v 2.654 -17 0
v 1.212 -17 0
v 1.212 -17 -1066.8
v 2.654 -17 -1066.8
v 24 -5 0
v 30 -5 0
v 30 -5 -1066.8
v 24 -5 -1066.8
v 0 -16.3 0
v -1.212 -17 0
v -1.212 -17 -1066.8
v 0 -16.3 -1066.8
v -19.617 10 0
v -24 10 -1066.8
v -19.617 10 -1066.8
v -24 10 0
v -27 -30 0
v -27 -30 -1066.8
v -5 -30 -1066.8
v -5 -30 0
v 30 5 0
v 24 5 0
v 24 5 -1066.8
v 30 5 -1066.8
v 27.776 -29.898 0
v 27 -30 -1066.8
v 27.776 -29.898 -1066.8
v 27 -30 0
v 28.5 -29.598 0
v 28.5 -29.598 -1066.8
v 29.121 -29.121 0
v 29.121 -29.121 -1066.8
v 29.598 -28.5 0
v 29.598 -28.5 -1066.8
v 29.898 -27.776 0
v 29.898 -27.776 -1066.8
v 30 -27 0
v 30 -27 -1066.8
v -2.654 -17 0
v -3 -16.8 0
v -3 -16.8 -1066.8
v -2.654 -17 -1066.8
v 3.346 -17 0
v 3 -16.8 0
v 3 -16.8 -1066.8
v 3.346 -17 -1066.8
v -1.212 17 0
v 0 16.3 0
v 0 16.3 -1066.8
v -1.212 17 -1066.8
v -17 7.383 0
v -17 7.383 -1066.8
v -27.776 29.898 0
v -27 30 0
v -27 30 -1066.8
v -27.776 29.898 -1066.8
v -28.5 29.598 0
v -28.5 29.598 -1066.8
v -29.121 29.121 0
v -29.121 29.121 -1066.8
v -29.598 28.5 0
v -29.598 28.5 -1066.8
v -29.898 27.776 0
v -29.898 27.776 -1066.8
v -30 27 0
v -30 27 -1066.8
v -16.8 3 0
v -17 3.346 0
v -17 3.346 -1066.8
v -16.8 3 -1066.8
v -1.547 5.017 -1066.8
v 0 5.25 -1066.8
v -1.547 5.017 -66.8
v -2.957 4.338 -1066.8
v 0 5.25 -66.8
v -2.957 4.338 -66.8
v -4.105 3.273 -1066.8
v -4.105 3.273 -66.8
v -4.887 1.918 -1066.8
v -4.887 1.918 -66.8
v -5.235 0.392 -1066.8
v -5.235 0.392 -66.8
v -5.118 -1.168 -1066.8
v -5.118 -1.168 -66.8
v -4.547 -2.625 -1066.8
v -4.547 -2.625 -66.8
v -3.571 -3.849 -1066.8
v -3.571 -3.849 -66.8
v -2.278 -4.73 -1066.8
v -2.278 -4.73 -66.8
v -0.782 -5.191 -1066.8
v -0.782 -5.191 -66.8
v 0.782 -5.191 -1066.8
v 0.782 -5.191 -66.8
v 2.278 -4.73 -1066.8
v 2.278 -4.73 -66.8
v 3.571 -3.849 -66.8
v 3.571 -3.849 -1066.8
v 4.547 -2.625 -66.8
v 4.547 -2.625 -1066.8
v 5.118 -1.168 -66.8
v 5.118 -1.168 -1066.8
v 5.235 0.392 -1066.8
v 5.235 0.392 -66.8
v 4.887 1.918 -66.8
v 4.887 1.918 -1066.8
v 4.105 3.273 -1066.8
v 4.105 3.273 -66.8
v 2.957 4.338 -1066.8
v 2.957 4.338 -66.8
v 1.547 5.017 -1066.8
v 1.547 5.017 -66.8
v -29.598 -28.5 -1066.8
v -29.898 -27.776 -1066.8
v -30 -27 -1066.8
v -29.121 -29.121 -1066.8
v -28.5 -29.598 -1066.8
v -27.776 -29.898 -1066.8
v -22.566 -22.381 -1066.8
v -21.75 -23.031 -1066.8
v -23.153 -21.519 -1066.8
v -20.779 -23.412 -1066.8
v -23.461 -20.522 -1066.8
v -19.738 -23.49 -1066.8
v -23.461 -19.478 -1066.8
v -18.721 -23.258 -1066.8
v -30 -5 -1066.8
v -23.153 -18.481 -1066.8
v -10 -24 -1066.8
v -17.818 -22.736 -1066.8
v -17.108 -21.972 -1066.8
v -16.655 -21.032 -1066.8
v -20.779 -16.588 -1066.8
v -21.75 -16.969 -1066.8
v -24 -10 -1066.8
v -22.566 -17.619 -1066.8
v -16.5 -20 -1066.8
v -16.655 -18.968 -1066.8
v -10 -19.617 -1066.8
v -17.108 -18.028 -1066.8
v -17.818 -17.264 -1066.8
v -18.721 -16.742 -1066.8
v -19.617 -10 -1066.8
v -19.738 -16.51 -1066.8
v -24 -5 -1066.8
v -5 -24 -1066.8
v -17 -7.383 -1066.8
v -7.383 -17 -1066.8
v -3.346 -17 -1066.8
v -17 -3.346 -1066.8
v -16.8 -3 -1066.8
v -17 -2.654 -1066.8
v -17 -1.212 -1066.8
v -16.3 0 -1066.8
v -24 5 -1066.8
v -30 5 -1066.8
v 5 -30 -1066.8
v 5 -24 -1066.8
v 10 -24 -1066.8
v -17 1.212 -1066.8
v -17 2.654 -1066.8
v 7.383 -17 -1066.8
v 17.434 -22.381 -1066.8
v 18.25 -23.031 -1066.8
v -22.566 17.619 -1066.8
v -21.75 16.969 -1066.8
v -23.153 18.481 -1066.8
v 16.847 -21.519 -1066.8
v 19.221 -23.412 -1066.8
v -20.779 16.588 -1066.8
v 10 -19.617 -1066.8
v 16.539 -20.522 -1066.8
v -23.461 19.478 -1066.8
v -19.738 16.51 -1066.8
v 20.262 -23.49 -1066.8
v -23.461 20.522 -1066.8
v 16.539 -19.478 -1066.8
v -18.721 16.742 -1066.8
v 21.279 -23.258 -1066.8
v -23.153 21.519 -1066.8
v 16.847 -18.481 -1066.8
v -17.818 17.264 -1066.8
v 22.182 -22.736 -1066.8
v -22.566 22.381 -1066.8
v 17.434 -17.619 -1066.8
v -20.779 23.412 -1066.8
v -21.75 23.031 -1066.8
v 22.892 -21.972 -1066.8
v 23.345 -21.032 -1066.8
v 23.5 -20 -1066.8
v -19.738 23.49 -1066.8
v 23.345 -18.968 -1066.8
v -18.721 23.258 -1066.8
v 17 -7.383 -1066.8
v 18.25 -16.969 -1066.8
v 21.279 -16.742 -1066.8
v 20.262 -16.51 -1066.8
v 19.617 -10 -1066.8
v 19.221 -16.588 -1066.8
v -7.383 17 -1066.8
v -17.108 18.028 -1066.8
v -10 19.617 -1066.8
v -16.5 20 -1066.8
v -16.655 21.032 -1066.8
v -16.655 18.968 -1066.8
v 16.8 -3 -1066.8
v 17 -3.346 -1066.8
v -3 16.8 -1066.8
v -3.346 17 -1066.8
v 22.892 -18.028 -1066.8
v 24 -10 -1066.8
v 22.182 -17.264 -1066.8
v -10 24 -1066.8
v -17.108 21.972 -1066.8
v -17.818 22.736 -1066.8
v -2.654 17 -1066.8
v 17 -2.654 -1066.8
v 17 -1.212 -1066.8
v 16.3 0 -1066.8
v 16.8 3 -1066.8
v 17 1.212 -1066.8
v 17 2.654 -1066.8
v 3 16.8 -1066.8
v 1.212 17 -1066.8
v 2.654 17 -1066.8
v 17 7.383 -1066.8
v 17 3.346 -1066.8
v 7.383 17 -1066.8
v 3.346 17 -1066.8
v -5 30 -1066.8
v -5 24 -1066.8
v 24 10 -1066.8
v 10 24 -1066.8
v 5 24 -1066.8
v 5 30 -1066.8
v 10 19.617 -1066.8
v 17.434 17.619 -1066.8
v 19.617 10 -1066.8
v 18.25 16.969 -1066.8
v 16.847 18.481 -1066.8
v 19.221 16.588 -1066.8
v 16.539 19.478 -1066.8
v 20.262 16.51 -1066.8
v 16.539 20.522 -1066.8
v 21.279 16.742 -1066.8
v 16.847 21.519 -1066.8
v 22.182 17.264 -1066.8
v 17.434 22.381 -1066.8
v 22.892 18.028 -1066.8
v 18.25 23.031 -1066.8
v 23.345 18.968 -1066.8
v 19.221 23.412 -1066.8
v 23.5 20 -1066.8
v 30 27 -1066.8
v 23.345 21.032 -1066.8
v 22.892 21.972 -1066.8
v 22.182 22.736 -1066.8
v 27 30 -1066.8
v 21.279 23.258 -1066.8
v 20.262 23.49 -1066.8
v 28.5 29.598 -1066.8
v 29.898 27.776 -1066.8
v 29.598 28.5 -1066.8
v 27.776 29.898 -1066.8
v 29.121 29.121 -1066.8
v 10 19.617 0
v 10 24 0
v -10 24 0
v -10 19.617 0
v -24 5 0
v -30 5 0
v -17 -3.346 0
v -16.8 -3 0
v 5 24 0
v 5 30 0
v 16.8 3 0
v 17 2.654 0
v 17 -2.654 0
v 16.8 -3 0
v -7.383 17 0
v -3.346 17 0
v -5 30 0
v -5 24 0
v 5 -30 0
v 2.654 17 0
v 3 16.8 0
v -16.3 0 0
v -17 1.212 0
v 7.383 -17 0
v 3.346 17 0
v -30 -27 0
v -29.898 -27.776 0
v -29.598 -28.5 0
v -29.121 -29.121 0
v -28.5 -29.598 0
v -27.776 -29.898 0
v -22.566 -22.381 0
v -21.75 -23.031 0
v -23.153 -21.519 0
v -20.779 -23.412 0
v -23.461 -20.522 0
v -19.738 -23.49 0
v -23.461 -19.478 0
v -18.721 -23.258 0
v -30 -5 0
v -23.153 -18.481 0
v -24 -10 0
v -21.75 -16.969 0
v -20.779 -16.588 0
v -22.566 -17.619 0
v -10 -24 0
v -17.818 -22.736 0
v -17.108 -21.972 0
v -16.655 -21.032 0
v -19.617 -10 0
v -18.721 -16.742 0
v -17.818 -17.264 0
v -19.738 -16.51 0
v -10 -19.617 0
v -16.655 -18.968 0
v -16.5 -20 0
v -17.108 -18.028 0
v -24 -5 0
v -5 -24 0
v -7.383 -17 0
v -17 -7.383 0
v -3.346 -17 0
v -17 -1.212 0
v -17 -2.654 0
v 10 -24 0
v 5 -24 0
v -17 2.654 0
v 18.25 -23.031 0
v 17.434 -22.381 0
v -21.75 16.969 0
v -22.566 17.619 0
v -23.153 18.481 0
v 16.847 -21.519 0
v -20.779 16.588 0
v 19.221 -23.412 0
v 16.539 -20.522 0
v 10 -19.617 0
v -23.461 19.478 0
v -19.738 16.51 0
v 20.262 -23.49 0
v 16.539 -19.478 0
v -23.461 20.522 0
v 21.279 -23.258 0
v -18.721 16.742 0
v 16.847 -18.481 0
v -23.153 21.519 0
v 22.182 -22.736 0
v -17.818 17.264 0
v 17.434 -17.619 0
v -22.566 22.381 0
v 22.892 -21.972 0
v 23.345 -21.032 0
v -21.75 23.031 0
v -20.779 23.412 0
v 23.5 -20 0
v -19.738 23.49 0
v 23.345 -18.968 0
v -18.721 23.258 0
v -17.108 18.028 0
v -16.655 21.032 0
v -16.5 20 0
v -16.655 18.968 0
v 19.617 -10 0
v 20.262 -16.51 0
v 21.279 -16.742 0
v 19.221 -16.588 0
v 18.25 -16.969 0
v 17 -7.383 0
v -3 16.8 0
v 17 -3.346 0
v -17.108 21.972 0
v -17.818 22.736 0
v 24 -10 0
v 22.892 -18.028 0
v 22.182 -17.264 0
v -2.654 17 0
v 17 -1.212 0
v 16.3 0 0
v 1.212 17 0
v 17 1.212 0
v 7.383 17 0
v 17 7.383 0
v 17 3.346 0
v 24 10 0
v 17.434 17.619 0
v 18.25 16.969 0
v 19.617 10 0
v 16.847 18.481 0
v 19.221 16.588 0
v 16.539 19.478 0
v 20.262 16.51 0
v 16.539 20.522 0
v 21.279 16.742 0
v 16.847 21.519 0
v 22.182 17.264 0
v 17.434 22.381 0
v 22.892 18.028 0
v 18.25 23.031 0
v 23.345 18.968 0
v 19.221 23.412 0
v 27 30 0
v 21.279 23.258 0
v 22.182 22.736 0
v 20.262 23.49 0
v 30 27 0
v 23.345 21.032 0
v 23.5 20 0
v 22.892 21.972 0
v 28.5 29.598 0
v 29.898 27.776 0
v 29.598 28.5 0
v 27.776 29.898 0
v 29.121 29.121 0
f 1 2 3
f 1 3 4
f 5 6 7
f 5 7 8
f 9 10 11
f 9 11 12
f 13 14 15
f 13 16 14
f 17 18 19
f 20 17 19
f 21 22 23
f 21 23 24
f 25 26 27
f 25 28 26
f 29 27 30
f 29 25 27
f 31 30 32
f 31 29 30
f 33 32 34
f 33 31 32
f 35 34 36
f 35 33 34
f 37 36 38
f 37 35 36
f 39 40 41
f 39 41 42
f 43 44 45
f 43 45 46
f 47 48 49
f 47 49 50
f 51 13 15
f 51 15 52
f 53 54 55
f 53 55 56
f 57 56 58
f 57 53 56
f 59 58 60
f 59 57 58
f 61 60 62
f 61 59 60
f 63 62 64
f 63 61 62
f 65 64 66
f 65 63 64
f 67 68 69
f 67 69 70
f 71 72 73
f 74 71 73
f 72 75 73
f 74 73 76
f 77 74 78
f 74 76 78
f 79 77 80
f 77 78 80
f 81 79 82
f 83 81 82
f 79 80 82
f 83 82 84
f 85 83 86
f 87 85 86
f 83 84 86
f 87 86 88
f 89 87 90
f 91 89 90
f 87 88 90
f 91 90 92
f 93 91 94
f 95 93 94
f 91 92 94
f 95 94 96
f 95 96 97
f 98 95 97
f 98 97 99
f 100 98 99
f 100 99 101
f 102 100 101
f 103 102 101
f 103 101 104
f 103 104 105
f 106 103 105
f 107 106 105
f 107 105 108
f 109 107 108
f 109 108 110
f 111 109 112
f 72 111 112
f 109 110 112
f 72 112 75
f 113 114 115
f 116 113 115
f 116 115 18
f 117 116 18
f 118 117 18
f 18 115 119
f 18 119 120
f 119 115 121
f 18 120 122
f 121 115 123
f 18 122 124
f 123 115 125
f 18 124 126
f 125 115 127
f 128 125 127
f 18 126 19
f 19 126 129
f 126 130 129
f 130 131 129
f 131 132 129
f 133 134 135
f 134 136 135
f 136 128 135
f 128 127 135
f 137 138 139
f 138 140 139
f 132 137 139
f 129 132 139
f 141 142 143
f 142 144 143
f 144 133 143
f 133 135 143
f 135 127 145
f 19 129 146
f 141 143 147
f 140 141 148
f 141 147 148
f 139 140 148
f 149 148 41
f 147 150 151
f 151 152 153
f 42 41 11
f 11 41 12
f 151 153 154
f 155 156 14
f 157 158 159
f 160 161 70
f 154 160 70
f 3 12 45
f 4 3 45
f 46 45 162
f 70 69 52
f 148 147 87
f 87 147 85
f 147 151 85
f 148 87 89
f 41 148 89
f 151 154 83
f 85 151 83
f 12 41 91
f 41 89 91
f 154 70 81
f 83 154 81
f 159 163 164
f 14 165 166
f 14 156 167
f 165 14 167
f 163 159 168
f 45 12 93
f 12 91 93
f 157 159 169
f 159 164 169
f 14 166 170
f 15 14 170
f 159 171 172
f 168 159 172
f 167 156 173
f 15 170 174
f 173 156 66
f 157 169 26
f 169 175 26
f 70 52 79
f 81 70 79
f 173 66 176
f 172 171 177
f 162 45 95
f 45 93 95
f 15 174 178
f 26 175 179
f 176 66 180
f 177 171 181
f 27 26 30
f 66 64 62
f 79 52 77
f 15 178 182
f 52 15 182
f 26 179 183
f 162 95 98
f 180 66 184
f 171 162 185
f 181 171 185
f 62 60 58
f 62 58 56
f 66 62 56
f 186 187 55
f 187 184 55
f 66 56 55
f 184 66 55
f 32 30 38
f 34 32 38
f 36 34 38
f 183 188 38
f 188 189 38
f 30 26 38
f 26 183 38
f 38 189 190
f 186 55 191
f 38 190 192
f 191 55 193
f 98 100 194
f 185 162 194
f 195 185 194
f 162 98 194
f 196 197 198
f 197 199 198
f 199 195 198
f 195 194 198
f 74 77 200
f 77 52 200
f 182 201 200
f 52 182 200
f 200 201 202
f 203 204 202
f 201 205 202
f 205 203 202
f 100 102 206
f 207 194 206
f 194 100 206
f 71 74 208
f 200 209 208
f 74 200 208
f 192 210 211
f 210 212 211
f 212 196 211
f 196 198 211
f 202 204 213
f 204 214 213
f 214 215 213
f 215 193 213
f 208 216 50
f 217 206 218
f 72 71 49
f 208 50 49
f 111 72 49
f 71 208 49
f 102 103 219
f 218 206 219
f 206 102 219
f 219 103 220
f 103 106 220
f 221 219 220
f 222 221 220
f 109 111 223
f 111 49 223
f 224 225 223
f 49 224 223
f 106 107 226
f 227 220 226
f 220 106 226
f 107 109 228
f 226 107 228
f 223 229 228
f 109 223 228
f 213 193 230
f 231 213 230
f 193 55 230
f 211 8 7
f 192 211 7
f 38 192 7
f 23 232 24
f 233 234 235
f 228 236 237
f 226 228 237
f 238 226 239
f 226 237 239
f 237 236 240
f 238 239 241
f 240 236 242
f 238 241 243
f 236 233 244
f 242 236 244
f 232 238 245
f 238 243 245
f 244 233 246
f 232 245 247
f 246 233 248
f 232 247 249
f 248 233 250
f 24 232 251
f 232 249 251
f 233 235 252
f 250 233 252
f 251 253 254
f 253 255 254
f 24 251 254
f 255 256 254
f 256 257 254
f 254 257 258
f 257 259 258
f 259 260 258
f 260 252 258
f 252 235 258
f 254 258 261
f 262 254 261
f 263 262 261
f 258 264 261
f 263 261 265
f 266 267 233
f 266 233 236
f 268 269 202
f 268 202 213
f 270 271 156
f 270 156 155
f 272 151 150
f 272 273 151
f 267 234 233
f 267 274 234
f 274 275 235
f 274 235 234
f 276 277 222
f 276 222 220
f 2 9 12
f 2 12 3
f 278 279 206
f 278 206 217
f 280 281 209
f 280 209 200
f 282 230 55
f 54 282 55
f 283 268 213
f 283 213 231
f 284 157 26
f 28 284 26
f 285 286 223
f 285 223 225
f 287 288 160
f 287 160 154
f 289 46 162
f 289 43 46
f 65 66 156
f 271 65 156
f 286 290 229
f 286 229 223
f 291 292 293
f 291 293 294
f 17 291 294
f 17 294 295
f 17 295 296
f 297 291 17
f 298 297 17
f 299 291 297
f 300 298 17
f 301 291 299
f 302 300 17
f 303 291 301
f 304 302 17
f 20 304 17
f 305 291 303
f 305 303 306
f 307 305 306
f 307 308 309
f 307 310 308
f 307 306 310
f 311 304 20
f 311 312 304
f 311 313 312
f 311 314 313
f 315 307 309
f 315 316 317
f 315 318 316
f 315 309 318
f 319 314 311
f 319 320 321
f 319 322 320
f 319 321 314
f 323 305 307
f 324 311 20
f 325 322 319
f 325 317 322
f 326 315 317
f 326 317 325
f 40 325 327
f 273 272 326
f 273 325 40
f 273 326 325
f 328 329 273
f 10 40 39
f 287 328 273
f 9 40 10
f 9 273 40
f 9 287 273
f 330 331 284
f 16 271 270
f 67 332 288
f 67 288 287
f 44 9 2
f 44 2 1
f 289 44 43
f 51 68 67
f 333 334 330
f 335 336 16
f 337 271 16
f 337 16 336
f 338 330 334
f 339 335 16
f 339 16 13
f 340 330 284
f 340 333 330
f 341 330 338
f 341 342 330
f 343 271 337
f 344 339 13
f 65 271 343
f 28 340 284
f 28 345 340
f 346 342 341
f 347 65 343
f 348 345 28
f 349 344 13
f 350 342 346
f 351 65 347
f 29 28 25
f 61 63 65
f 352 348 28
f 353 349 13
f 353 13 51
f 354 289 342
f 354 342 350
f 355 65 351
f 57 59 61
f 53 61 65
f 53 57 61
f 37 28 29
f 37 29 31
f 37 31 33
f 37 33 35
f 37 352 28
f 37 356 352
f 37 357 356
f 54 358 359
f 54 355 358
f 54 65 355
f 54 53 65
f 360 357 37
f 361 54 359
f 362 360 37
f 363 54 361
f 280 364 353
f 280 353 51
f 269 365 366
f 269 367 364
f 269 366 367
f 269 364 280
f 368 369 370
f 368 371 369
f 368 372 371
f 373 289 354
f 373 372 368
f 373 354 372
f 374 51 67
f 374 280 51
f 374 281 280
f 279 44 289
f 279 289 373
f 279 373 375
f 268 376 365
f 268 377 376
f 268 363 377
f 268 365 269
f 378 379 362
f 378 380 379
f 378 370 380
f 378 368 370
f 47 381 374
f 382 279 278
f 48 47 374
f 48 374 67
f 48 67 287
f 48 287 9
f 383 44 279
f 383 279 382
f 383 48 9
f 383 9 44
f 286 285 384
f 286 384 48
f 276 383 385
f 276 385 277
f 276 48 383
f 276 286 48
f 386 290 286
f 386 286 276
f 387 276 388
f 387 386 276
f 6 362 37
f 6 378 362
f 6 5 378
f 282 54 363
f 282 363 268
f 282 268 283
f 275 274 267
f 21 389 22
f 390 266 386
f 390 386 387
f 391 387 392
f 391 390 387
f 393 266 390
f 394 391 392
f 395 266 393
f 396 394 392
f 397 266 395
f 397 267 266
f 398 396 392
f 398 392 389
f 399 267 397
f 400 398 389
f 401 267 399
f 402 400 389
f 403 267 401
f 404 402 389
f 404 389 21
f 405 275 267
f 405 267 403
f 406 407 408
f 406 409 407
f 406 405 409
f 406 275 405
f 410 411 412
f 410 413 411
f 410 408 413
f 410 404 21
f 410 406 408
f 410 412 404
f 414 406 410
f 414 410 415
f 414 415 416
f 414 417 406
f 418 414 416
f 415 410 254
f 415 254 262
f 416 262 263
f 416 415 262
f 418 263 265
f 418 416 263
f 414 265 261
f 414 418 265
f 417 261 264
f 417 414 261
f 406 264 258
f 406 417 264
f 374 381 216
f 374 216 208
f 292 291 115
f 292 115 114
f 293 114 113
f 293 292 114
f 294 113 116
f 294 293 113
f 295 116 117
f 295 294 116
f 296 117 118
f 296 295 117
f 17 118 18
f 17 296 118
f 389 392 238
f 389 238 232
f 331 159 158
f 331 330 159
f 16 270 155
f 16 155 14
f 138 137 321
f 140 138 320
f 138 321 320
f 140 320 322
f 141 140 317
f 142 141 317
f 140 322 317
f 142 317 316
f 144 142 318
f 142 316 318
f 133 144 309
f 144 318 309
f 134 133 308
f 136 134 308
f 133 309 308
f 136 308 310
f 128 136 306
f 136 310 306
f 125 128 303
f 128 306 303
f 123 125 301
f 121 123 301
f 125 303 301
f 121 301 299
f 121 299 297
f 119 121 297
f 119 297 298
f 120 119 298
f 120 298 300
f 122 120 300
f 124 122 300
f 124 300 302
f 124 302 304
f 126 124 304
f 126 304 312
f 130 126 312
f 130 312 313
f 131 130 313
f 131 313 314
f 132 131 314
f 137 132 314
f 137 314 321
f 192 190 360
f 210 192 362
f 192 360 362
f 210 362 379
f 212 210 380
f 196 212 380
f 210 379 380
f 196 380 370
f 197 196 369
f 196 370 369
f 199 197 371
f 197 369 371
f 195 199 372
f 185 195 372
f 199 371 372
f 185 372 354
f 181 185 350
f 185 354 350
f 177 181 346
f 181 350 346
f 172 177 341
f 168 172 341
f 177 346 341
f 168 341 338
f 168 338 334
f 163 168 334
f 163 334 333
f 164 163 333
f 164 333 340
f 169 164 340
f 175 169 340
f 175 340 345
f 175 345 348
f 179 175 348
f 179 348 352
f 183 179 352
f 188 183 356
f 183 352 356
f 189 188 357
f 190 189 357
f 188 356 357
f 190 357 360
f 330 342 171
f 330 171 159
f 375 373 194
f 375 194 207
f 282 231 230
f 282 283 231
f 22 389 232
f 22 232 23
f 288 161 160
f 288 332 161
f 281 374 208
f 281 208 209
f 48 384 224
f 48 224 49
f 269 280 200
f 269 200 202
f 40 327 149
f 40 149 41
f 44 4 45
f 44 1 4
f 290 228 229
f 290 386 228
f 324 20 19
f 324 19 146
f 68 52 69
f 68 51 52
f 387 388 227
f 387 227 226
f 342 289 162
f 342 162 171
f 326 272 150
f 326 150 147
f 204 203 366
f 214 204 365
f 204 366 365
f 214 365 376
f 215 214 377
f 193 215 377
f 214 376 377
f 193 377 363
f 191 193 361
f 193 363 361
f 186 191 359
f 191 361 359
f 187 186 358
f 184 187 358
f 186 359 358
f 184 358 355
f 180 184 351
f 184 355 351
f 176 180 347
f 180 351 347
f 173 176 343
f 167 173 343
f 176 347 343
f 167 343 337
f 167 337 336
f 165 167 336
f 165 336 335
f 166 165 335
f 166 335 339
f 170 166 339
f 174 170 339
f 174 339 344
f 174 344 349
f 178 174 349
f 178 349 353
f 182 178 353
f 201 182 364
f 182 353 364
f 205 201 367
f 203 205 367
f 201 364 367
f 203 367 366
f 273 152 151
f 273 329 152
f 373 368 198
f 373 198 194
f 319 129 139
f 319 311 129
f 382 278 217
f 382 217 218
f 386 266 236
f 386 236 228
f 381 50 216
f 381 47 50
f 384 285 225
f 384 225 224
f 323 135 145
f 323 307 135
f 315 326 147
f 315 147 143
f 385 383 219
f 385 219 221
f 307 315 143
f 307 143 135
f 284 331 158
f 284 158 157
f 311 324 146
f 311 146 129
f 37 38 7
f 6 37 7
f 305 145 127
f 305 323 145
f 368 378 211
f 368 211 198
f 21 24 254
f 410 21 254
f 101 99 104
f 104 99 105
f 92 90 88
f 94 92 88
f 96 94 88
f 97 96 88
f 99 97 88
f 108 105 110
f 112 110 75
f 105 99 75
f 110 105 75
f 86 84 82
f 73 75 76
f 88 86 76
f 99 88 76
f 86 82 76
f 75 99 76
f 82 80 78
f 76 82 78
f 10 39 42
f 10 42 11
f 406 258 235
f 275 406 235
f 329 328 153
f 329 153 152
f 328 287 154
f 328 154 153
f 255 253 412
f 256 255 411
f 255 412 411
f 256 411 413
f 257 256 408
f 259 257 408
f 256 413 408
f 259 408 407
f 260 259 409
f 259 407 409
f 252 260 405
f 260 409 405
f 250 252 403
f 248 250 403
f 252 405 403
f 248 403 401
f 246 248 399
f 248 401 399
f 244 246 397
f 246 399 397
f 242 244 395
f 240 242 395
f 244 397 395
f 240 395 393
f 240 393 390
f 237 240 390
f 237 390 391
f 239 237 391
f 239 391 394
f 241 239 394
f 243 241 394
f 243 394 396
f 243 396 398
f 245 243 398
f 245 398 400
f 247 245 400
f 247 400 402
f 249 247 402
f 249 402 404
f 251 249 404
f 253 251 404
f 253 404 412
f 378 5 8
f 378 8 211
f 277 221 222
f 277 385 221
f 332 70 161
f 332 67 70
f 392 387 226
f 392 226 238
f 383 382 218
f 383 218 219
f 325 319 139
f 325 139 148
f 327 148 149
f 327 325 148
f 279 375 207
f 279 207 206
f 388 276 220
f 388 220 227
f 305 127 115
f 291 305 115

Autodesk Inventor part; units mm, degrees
sketch "Sketch_60" plane through (0, 0, 0) normal (0, 0, 1) x (1, 0, 0)
  arc A0 (-30, -27) -> (-27, -30) centre (-27, -27) ccw
  line L0 (-27, -30) -> (-5, -30)
  line L1 (-5, -30) -> (-5, -24)
  line L2 (-5, -24) -> (-10, -24)
  line L3 (-10, -24) -> (-10, -19.6167)
  line L4 (-10, -19.6167) -> (-7.3833, -17)
  line L5 (-7.3833, -17) -> (-3.3464, -17)
  line L6 (-3.3464, -17) -> (-3, -16.8)
  line L7 (-3, -16.8) -> (-2.6536, -17)
  line L8 (-2.6536, -17) -> (-1.2124, -17)
  line L9 (-1.2124, -17) -> (0, -16.3)
  line L10 (0, -16.3) -> (1.2124, -17)
  line L11 (1.2124, -17) -> (2.6536, -17)
  line L12 (2.6536, -17) -> (3, -16.8)
  line L13 (3, -16.8) -> (3.3464, -17)
  line L14 (3.3464, -17) -> (7.3833, -17)
  line L15 (7.3833, -17) -> (10, -19.6167)
  line L16 (10, -19.6167) -> (10, -24)
  line L17 (10, -24) -> (5, -24)
  line L18 (5, -24) -> (5, -30)
  line L19 (5, -30) -> (27, -30)
  arc A1 (27, -30) -> (30, -27) centre (27, -27) ccw
  line L20 (30, -27) -> (30, -5)
  line L21 (30, -5) -> (24, -5)
  line L22 (24, -5) -> (24, -10)
  line L23 (24, -10) -> (19.6167, -10)
  line L24 (19.6167, -10) -> (17, -7.3833)
  line L25 (17, -7.3833) -> (17, -3.3464)
  line L26 (17, -3.3464) -> (16.8, -3)
  line L27 (16.8, -3) -> (17, -2.6536)
  line L28 (17, -2.6536) -> (17, -1.2124)
  line L29 (17, -1.2124) -> (16.3, 0)
  line L30 (16.3, 0) -> (17, 1.2124)
  line L31 (17, 1.2124) -> (17, 2.6536)
  line L32 (17, 2.6536) -> (16.8, 3)
  line L33 (16.8, 3) -> (17, 3.3464)
  line L34 (17, 3.3464) -> (17, 7.3833)
  line L35 (17, 7.3833) -> (19.6167, 10)
  line L36 (19.6167, 10) -> (24, 10)
  line L37 (24, 10) -> (24, 5)
  line L38 (24, 5) -> (30, 5)
  line L39 (30, 5) -> (30, 27)
  arc A2 (30, 27) -> (27, 30) centre (27, 27) ccw
  line L40 (27, 30) -> (5, 30)
  line L41 (5, 30) -> (5, 24)
  line L42 (5, 24) -> (10, 24)
  line L43 (10, 24) -> (10, 19.6167)
  line L44 (10, 19.6167) -> (7.3833, 17)
  line L45 (7.3833, 17) -> (3.3464, 17)
  line L46 (3.3464, 17) -> (3, 16.8)
  line L47 (3, 16.8) -> (2.6536, 17)
  line L48 (2.6536, 17) -> (1.2124, 17)
  line L49 (1.2124, 17) -> (0, 16.3)
  line L50 (0, 16.3) -> (-1.2124, 17)
  line L51 (-1.2124, 17) -> (-2.6536, 17)
  line L52 (-2.6536, 17) -> (-3, 16.8)
  line L53 (-3, 16.8) -> (-3.3464, 17)
  line L54 (-3.3464, 17) -> (-7.3833, 17)
  line L55 (-7.3833, 17) -> (-10, 19.6167)
  line L56 (-10, 19.6167) -> (-10, 24)
  line L57 (-10, 24) -> (-5, 24)
  line L58 (-5, 24) -> (-5, 30)
  line L59 (-5, 30) -> (-27, 30)
  arc A3 (-27, 30) -> (-30, 27) centre (-27, 27) ccw
  line L60 (-30, 27) -> (-30, 5)
  line L61 (-30, 5) -> (-24, 5)
  line L62 (-24, 5) -> (-24, 10)
  line L63 (-24, 10) -> (-19.6167, 10)
  line L64 (-19.6167, 10) -> (-17, 7.3833)
  line L65 (-17, 7.3833) -> (-17, 3.3464)
  line L66 (-17, 3.3464) -> (-16.8, 3)
  line L67 (-16.8, 3) -> (-17, 2.6536)
  line L68 (-17, 2.6536) -> (-17, 1.2124)
  line L69 (-17, 1.2124) -> (-16.3, 0)
  line L70 (-16.3, 0) -> (-17, -1.2124)
  line L71 (-17, -1.2124) -> (-17, -2.6536)
  line L72 (-17, -2.6536) -> (-16.8, -3)
  line L73 (-16.8, -3) -> (-17, -3.3464)
  line L74 (-17, -3.3464) -> (-17, -7.3833)
  line L75 (-17, -7.3833) -> (-19.6167, -10)
  line L76 (-19.6167, -10) -> (-24, -10)
  line L77 (-24, -10) -> (-24, -5)
  line L78 (-24, -5) -> (-30, -5)
  line L79 (-30, -5) -> (-30, -27)
  circle A4 centre (20, 20) radius 3.5
  circle A5 centre (20, -20) radius 3.5
  circle A6 centre (-20, 20) radius 3.5
  circle A7 centre (-20, -20) radius 3.5
extrude "Extrusion1" add sketch "Sketch_60" against normal blind 1066.8
sketch "Sketch2" plane through (0, 0, -1066.8) normal (0, 0, -1) x (-1, 0, 0)
  point P0 (0, 0)
hole "Hole1" at (0, 0, -1066.8) direction (0, 0, 1) diameter 10.5 depth 1000
ref_plane "C1_XY" through (0, 0, 0) normal (0, 0, 1) x (1, 0, 0)
ref_plane "C1_YZ" through (0, 0, 0) normal (1, 0, 0) x (0, 1, 0)
ref_plane "C1_ZX" through (0, 0, 0) normal (0, 1, 0) x (0, 0, 1)
ref_plane "to_frame_cap1_XY" through (0, 0, 0) normal (0, 0, 1) x (1, 0, 0)
ref_plane "to_frame_cap1_YZ" through (0, 0, 0) normal (1, 0, 0) x (0, 1, 0)
ref_plane "to_frame_cap1_ZX" through (0, 0, 0) normal (0, 1, 0) x (0, 0, 1)
ref_plane "to_frame_cap2_XY" through (0, 0, -1000) normal (0, 0, -1) x (1, 0, 0)
ref_plane "to_frame_cap2_YZ" through (0, 0, -1000) normal (1, 0, 0) x (0, -1, 0)
ref_plane "to_frame_cap2_ZX" through (0, 0, -1000) normal (0, -1, 0) x (0, 0, -1)
properties part number "6060-3.5"
